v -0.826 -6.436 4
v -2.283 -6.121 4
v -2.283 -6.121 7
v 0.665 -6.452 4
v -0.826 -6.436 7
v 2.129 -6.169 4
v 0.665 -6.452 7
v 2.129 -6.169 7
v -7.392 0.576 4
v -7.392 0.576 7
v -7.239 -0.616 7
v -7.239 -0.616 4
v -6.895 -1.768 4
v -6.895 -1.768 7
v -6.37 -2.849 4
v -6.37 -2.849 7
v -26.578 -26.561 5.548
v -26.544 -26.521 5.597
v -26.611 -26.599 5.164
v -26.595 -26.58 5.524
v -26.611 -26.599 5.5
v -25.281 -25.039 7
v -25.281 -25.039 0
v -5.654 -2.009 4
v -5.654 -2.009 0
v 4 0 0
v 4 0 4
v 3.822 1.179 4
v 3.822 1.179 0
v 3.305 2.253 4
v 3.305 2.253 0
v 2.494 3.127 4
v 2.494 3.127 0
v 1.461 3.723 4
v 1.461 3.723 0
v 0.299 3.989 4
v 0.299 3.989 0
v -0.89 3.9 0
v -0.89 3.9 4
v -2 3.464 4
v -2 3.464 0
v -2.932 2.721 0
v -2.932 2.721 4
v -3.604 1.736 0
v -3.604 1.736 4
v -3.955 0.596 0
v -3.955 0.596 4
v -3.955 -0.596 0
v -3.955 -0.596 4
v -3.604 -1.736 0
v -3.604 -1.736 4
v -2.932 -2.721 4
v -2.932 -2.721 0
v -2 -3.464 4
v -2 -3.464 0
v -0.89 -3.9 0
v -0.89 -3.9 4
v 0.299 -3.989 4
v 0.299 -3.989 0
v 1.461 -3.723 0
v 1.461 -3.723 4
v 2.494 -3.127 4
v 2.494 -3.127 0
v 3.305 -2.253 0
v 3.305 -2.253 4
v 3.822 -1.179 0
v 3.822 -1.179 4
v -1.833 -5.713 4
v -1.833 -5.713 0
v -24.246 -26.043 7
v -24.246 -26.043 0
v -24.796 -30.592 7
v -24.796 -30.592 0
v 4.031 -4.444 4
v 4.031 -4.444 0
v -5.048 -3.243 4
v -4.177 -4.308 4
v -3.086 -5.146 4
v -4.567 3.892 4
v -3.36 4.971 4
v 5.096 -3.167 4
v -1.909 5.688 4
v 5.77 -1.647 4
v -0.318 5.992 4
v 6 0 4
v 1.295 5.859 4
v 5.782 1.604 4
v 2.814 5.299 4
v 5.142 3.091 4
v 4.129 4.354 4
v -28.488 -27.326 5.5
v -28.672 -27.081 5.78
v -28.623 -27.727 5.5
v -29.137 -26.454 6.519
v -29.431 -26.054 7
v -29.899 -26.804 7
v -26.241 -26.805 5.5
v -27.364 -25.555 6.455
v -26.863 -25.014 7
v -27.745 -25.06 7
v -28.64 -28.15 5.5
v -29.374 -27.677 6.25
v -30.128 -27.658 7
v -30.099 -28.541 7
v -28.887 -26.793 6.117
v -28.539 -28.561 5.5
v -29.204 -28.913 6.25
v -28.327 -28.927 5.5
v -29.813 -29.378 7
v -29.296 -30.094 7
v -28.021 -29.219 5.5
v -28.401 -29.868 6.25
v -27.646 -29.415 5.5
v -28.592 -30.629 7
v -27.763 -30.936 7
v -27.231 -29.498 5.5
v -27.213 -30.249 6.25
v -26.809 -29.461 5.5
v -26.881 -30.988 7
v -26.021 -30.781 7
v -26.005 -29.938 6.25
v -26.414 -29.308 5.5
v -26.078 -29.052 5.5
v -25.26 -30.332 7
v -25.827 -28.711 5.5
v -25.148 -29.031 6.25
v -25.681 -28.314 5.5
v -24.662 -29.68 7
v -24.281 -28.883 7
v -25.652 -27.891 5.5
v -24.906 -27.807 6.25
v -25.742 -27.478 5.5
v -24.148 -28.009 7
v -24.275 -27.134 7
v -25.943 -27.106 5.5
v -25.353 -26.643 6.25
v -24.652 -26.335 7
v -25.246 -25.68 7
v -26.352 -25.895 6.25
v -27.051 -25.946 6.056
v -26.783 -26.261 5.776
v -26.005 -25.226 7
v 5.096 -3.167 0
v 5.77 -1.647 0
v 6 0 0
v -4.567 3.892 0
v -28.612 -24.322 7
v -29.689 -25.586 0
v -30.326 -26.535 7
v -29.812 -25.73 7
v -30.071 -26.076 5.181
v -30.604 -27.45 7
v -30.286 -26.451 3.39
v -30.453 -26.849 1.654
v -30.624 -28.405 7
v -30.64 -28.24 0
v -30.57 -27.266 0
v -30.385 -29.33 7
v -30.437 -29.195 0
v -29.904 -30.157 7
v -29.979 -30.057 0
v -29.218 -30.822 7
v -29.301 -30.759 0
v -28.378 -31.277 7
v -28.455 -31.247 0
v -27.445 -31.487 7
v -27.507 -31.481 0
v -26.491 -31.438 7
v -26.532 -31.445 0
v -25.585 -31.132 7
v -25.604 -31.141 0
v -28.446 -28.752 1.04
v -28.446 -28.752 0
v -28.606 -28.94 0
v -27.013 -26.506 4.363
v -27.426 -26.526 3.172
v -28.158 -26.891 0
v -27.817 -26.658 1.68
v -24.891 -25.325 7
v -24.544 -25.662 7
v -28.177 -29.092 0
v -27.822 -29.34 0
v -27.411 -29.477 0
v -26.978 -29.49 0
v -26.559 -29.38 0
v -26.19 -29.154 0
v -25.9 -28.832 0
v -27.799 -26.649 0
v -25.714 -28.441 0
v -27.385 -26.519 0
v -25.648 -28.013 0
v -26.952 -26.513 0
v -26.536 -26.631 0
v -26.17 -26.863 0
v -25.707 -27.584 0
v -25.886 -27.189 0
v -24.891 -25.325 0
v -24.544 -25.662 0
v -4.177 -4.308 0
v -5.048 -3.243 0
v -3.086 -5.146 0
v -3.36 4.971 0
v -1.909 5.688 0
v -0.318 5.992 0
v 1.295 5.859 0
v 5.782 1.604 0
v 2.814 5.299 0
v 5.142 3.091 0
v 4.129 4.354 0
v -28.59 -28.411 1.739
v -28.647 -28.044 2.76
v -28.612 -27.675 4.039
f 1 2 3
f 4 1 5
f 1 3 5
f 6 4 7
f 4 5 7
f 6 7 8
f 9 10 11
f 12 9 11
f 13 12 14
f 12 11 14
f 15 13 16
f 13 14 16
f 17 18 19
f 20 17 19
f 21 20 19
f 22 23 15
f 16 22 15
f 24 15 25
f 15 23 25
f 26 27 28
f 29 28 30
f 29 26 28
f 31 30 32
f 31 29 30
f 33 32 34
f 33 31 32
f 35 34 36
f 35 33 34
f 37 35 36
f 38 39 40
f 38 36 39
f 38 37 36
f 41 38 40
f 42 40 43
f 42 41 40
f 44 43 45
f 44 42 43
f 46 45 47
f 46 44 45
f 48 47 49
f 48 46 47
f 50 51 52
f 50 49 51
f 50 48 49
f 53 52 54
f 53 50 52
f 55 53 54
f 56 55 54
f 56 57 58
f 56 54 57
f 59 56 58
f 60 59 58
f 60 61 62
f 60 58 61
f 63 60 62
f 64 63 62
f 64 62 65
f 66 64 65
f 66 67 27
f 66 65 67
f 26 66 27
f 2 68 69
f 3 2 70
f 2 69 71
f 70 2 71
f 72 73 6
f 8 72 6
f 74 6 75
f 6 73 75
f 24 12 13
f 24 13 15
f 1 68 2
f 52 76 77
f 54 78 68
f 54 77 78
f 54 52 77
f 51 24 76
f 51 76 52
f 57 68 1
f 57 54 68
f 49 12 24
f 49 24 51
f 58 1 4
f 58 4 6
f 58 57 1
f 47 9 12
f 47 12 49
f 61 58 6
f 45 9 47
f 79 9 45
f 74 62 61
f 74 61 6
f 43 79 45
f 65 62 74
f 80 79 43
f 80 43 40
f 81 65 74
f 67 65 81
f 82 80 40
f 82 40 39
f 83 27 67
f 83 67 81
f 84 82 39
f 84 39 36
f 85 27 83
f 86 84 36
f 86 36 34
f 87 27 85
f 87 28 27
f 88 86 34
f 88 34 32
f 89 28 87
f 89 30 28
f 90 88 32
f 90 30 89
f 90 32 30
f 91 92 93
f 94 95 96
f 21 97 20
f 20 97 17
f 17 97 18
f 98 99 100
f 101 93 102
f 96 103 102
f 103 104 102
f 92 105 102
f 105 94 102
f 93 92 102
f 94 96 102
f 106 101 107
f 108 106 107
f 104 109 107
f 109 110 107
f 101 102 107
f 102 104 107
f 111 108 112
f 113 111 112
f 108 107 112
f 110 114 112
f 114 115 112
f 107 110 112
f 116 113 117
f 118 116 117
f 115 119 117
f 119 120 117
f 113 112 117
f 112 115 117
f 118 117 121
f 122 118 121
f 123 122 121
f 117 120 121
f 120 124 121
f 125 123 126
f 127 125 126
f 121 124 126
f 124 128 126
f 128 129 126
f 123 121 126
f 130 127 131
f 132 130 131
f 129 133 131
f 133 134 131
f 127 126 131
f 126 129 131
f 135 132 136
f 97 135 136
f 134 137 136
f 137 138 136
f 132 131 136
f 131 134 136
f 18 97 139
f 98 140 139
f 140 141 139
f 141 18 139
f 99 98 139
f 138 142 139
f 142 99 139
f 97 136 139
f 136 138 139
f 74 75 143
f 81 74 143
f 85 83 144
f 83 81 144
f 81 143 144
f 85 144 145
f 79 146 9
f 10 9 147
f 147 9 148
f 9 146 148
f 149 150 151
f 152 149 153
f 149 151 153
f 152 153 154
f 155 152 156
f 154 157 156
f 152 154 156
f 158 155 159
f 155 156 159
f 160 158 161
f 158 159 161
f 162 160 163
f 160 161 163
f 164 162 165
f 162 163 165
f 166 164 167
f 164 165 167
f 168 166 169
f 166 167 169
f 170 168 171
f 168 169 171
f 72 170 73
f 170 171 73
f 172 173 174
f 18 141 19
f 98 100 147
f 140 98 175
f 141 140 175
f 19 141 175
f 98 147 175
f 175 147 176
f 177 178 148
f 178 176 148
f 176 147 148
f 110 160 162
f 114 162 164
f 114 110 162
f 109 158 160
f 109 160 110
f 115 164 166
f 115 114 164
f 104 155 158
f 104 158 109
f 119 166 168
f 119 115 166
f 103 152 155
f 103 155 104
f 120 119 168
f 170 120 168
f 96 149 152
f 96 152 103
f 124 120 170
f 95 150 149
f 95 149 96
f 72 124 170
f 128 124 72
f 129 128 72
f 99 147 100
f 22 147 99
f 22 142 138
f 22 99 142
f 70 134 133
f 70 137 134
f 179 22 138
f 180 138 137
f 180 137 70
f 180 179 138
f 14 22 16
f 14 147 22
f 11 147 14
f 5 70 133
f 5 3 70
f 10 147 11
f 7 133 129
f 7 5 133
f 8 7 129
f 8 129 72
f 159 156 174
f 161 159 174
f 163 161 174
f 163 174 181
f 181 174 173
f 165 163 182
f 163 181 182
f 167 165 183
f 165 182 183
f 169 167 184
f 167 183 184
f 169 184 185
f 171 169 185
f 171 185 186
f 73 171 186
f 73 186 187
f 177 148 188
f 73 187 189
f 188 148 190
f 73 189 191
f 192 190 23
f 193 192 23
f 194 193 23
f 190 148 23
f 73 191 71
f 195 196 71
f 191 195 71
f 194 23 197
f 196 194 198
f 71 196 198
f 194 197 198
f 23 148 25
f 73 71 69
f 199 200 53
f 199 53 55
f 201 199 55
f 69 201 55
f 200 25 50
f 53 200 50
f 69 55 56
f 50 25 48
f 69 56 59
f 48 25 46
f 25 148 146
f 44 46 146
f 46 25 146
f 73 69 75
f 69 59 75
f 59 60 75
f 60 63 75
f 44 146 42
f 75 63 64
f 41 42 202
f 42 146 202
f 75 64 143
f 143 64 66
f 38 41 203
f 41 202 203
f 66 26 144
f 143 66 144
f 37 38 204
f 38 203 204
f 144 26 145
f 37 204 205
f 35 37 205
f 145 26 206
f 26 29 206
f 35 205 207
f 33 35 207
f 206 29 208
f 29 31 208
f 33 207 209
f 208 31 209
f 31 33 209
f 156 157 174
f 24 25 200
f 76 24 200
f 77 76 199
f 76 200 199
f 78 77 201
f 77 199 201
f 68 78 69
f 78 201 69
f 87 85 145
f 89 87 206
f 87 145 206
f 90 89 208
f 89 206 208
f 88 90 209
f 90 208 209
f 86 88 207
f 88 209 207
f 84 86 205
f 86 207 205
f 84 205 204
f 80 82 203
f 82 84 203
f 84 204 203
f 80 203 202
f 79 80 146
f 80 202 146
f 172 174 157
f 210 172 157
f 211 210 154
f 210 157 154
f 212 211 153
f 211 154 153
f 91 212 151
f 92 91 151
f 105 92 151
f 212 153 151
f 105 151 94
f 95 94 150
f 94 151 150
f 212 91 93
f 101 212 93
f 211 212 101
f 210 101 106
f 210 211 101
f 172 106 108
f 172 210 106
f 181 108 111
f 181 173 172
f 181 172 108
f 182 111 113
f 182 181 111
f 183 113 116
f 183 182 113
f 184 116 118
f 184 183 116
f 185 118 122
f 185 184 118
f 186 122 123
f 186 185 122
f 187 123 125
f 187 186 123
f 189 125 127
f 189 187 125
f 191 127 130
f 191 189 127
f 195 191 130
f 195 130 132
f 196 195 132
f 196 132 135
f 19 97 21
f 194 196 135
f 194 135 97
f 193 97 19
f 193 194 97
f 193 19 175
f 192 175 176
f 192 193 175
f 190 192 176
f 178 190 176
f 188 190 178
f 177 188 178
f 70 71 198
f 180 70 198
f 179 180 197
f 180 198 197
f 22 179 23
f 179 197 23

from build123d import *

# Parameters (mm, degrees)
F0_R     = 4
F0_R_2   = 1.5
F1_DEPTH = 7
F2_R     = 7.4
F3_DEPTH = 3
F4_SIZE  = 1.5
F6_DEPTH = 3


with BuildPart() as f1:
    # F0 (on Top) → F1 (new body)
    with BuildSketch(Plane.XY):
        with BuildLine():
            ThreePointArc((4.0311035144, -4.4441202117), (5.48573701, -2.4303681731), (6, 0))
            ThreePointArc((6, 0), (2.0737198646, 5.6302474122), (-4.5665619744, 3.8918519671))
            ThreePointArc((-4.5665619744, 3.8918519671), (-5.9006846613, 1.0871616841), (-5.6537236585, -2.0088326942))
            ThreePointArc((-5.6537236585, -2.0088326942), (-4.1765759878, -4.3076923077), (-1.8331692436, -5.7130981546))
            ThreePointArc((-1.8331692436, -5.7130981546), (1.2689779429, -5.864272758), (4.0311035144, -4.4441202117))
        make_face()
        Circle(F0_R, mode=Mode.SUBTRACT)
        with BuildLine():
            ThreePointArc((-5.6537236585, -2.0088326942), (-5.9006846613, 1.0871616841), (-4.5665619744, 3.8918519671))
            Line((-4.5665619744, 3.8918519671), (-29.8115717394, -25.7297530192))
            ThreePointArc((-29.8115717394, -25.7297530192), (-27.6751829567, -24.5399699331), (-25.2813289713, -25.0391732176))
            Line((-25.2813289713, -25.0391732176), (-5.6537236585, -2.0088326942))
        make_face()
        with BuildLine():
            Line((-24.7962668709, -30.5924034568), (4.0311035144, -4.4441202117))
            ThreePointArc((4.0311035144, -4.4441202117), (1.2689779429, -5.864272758), (-1.8331692436, -5.7130981546))
            Line((-1.8331692436, -5.7130981546), (-24.2460046276, -26.0429846518))
            ThreePointArc((-24.2460046276, -26.0429846518), (-23.8006490966, -26.9767912058), (-23.647743921, -28))
            ThreePointArc((-23.647743921, -28), (-23.9477306651, -29.4177147676), (-24.7962668709, -30.5924034568))
        make_face()
        with BuildLine():
            ThreePointArc((-25.2813289713, -25.0391732176), (-27.6751829567, -24.5399699331), (-29.8115717394, -25.7297530192))
            ThreePointArc((-29.8115717394, -25.7297530192), (-29.5840799139, -30.5128205128), (-24.7962668709, -30.5924034568))
            ThreePointArc((-24.7962668709, -30.5924034568), (-23.9477306651, -29.4177147676), (-23.647743921, -28))
            ThreePointArc((-23.647743921, -28), (-23.8006490966, -26.9767912058), (-24.2460046276, -26.0429846518))
            ThreePointArc((-24.2460046276, -26.0429846518), (-24.7114079281, -25.4871794872), (-25.2813289713, -25.0391732176))
        make_face()
        with Locations((-27.147743921, -28)):
            Circle(F0_R_2, mode=Mode.SUBTRACT)
    extrude(amount=F1_DEPTH)

    # F2 (on face) → F3 (cut)
    with BuildSketch(Plane.XY.offset(7)):
        with Locations((0, 0.9179179191)):
            Circle(F2_R)
    extrude(amount=-F3_DEPTH, mode=Mode.SUBTRACT)

    # F4
    f4_edges = [f1.edges().sort_by_distance(p)[0] for p in [
        (-28.647744, -28, 7),
    ]]
    chamfer(f4_edges, length=F4_SIZE)

    # F5 (on face) → F6 (cut)
    with BuildSketch(Plane(origin=(-4.5665619744, 3.8918519671, 0), x_dir=(-0.6486419945, -0.7610936624, 0), z_dir=(-0.7610936624, 0.6486419945, 0))):
        Polygon((40.5807819354, 0), (38.9197893108, 7), (38.9197893108, 0), align=None)
        Polygon((38.9197893108, 0), (38.9197893108, 7), (37.0698095831, 7), (38.7308022077, 0), align=None)
    extrude(amount=-F6_DEPTH, mode=Mode.SUBTRACT)


solid = f1.part
